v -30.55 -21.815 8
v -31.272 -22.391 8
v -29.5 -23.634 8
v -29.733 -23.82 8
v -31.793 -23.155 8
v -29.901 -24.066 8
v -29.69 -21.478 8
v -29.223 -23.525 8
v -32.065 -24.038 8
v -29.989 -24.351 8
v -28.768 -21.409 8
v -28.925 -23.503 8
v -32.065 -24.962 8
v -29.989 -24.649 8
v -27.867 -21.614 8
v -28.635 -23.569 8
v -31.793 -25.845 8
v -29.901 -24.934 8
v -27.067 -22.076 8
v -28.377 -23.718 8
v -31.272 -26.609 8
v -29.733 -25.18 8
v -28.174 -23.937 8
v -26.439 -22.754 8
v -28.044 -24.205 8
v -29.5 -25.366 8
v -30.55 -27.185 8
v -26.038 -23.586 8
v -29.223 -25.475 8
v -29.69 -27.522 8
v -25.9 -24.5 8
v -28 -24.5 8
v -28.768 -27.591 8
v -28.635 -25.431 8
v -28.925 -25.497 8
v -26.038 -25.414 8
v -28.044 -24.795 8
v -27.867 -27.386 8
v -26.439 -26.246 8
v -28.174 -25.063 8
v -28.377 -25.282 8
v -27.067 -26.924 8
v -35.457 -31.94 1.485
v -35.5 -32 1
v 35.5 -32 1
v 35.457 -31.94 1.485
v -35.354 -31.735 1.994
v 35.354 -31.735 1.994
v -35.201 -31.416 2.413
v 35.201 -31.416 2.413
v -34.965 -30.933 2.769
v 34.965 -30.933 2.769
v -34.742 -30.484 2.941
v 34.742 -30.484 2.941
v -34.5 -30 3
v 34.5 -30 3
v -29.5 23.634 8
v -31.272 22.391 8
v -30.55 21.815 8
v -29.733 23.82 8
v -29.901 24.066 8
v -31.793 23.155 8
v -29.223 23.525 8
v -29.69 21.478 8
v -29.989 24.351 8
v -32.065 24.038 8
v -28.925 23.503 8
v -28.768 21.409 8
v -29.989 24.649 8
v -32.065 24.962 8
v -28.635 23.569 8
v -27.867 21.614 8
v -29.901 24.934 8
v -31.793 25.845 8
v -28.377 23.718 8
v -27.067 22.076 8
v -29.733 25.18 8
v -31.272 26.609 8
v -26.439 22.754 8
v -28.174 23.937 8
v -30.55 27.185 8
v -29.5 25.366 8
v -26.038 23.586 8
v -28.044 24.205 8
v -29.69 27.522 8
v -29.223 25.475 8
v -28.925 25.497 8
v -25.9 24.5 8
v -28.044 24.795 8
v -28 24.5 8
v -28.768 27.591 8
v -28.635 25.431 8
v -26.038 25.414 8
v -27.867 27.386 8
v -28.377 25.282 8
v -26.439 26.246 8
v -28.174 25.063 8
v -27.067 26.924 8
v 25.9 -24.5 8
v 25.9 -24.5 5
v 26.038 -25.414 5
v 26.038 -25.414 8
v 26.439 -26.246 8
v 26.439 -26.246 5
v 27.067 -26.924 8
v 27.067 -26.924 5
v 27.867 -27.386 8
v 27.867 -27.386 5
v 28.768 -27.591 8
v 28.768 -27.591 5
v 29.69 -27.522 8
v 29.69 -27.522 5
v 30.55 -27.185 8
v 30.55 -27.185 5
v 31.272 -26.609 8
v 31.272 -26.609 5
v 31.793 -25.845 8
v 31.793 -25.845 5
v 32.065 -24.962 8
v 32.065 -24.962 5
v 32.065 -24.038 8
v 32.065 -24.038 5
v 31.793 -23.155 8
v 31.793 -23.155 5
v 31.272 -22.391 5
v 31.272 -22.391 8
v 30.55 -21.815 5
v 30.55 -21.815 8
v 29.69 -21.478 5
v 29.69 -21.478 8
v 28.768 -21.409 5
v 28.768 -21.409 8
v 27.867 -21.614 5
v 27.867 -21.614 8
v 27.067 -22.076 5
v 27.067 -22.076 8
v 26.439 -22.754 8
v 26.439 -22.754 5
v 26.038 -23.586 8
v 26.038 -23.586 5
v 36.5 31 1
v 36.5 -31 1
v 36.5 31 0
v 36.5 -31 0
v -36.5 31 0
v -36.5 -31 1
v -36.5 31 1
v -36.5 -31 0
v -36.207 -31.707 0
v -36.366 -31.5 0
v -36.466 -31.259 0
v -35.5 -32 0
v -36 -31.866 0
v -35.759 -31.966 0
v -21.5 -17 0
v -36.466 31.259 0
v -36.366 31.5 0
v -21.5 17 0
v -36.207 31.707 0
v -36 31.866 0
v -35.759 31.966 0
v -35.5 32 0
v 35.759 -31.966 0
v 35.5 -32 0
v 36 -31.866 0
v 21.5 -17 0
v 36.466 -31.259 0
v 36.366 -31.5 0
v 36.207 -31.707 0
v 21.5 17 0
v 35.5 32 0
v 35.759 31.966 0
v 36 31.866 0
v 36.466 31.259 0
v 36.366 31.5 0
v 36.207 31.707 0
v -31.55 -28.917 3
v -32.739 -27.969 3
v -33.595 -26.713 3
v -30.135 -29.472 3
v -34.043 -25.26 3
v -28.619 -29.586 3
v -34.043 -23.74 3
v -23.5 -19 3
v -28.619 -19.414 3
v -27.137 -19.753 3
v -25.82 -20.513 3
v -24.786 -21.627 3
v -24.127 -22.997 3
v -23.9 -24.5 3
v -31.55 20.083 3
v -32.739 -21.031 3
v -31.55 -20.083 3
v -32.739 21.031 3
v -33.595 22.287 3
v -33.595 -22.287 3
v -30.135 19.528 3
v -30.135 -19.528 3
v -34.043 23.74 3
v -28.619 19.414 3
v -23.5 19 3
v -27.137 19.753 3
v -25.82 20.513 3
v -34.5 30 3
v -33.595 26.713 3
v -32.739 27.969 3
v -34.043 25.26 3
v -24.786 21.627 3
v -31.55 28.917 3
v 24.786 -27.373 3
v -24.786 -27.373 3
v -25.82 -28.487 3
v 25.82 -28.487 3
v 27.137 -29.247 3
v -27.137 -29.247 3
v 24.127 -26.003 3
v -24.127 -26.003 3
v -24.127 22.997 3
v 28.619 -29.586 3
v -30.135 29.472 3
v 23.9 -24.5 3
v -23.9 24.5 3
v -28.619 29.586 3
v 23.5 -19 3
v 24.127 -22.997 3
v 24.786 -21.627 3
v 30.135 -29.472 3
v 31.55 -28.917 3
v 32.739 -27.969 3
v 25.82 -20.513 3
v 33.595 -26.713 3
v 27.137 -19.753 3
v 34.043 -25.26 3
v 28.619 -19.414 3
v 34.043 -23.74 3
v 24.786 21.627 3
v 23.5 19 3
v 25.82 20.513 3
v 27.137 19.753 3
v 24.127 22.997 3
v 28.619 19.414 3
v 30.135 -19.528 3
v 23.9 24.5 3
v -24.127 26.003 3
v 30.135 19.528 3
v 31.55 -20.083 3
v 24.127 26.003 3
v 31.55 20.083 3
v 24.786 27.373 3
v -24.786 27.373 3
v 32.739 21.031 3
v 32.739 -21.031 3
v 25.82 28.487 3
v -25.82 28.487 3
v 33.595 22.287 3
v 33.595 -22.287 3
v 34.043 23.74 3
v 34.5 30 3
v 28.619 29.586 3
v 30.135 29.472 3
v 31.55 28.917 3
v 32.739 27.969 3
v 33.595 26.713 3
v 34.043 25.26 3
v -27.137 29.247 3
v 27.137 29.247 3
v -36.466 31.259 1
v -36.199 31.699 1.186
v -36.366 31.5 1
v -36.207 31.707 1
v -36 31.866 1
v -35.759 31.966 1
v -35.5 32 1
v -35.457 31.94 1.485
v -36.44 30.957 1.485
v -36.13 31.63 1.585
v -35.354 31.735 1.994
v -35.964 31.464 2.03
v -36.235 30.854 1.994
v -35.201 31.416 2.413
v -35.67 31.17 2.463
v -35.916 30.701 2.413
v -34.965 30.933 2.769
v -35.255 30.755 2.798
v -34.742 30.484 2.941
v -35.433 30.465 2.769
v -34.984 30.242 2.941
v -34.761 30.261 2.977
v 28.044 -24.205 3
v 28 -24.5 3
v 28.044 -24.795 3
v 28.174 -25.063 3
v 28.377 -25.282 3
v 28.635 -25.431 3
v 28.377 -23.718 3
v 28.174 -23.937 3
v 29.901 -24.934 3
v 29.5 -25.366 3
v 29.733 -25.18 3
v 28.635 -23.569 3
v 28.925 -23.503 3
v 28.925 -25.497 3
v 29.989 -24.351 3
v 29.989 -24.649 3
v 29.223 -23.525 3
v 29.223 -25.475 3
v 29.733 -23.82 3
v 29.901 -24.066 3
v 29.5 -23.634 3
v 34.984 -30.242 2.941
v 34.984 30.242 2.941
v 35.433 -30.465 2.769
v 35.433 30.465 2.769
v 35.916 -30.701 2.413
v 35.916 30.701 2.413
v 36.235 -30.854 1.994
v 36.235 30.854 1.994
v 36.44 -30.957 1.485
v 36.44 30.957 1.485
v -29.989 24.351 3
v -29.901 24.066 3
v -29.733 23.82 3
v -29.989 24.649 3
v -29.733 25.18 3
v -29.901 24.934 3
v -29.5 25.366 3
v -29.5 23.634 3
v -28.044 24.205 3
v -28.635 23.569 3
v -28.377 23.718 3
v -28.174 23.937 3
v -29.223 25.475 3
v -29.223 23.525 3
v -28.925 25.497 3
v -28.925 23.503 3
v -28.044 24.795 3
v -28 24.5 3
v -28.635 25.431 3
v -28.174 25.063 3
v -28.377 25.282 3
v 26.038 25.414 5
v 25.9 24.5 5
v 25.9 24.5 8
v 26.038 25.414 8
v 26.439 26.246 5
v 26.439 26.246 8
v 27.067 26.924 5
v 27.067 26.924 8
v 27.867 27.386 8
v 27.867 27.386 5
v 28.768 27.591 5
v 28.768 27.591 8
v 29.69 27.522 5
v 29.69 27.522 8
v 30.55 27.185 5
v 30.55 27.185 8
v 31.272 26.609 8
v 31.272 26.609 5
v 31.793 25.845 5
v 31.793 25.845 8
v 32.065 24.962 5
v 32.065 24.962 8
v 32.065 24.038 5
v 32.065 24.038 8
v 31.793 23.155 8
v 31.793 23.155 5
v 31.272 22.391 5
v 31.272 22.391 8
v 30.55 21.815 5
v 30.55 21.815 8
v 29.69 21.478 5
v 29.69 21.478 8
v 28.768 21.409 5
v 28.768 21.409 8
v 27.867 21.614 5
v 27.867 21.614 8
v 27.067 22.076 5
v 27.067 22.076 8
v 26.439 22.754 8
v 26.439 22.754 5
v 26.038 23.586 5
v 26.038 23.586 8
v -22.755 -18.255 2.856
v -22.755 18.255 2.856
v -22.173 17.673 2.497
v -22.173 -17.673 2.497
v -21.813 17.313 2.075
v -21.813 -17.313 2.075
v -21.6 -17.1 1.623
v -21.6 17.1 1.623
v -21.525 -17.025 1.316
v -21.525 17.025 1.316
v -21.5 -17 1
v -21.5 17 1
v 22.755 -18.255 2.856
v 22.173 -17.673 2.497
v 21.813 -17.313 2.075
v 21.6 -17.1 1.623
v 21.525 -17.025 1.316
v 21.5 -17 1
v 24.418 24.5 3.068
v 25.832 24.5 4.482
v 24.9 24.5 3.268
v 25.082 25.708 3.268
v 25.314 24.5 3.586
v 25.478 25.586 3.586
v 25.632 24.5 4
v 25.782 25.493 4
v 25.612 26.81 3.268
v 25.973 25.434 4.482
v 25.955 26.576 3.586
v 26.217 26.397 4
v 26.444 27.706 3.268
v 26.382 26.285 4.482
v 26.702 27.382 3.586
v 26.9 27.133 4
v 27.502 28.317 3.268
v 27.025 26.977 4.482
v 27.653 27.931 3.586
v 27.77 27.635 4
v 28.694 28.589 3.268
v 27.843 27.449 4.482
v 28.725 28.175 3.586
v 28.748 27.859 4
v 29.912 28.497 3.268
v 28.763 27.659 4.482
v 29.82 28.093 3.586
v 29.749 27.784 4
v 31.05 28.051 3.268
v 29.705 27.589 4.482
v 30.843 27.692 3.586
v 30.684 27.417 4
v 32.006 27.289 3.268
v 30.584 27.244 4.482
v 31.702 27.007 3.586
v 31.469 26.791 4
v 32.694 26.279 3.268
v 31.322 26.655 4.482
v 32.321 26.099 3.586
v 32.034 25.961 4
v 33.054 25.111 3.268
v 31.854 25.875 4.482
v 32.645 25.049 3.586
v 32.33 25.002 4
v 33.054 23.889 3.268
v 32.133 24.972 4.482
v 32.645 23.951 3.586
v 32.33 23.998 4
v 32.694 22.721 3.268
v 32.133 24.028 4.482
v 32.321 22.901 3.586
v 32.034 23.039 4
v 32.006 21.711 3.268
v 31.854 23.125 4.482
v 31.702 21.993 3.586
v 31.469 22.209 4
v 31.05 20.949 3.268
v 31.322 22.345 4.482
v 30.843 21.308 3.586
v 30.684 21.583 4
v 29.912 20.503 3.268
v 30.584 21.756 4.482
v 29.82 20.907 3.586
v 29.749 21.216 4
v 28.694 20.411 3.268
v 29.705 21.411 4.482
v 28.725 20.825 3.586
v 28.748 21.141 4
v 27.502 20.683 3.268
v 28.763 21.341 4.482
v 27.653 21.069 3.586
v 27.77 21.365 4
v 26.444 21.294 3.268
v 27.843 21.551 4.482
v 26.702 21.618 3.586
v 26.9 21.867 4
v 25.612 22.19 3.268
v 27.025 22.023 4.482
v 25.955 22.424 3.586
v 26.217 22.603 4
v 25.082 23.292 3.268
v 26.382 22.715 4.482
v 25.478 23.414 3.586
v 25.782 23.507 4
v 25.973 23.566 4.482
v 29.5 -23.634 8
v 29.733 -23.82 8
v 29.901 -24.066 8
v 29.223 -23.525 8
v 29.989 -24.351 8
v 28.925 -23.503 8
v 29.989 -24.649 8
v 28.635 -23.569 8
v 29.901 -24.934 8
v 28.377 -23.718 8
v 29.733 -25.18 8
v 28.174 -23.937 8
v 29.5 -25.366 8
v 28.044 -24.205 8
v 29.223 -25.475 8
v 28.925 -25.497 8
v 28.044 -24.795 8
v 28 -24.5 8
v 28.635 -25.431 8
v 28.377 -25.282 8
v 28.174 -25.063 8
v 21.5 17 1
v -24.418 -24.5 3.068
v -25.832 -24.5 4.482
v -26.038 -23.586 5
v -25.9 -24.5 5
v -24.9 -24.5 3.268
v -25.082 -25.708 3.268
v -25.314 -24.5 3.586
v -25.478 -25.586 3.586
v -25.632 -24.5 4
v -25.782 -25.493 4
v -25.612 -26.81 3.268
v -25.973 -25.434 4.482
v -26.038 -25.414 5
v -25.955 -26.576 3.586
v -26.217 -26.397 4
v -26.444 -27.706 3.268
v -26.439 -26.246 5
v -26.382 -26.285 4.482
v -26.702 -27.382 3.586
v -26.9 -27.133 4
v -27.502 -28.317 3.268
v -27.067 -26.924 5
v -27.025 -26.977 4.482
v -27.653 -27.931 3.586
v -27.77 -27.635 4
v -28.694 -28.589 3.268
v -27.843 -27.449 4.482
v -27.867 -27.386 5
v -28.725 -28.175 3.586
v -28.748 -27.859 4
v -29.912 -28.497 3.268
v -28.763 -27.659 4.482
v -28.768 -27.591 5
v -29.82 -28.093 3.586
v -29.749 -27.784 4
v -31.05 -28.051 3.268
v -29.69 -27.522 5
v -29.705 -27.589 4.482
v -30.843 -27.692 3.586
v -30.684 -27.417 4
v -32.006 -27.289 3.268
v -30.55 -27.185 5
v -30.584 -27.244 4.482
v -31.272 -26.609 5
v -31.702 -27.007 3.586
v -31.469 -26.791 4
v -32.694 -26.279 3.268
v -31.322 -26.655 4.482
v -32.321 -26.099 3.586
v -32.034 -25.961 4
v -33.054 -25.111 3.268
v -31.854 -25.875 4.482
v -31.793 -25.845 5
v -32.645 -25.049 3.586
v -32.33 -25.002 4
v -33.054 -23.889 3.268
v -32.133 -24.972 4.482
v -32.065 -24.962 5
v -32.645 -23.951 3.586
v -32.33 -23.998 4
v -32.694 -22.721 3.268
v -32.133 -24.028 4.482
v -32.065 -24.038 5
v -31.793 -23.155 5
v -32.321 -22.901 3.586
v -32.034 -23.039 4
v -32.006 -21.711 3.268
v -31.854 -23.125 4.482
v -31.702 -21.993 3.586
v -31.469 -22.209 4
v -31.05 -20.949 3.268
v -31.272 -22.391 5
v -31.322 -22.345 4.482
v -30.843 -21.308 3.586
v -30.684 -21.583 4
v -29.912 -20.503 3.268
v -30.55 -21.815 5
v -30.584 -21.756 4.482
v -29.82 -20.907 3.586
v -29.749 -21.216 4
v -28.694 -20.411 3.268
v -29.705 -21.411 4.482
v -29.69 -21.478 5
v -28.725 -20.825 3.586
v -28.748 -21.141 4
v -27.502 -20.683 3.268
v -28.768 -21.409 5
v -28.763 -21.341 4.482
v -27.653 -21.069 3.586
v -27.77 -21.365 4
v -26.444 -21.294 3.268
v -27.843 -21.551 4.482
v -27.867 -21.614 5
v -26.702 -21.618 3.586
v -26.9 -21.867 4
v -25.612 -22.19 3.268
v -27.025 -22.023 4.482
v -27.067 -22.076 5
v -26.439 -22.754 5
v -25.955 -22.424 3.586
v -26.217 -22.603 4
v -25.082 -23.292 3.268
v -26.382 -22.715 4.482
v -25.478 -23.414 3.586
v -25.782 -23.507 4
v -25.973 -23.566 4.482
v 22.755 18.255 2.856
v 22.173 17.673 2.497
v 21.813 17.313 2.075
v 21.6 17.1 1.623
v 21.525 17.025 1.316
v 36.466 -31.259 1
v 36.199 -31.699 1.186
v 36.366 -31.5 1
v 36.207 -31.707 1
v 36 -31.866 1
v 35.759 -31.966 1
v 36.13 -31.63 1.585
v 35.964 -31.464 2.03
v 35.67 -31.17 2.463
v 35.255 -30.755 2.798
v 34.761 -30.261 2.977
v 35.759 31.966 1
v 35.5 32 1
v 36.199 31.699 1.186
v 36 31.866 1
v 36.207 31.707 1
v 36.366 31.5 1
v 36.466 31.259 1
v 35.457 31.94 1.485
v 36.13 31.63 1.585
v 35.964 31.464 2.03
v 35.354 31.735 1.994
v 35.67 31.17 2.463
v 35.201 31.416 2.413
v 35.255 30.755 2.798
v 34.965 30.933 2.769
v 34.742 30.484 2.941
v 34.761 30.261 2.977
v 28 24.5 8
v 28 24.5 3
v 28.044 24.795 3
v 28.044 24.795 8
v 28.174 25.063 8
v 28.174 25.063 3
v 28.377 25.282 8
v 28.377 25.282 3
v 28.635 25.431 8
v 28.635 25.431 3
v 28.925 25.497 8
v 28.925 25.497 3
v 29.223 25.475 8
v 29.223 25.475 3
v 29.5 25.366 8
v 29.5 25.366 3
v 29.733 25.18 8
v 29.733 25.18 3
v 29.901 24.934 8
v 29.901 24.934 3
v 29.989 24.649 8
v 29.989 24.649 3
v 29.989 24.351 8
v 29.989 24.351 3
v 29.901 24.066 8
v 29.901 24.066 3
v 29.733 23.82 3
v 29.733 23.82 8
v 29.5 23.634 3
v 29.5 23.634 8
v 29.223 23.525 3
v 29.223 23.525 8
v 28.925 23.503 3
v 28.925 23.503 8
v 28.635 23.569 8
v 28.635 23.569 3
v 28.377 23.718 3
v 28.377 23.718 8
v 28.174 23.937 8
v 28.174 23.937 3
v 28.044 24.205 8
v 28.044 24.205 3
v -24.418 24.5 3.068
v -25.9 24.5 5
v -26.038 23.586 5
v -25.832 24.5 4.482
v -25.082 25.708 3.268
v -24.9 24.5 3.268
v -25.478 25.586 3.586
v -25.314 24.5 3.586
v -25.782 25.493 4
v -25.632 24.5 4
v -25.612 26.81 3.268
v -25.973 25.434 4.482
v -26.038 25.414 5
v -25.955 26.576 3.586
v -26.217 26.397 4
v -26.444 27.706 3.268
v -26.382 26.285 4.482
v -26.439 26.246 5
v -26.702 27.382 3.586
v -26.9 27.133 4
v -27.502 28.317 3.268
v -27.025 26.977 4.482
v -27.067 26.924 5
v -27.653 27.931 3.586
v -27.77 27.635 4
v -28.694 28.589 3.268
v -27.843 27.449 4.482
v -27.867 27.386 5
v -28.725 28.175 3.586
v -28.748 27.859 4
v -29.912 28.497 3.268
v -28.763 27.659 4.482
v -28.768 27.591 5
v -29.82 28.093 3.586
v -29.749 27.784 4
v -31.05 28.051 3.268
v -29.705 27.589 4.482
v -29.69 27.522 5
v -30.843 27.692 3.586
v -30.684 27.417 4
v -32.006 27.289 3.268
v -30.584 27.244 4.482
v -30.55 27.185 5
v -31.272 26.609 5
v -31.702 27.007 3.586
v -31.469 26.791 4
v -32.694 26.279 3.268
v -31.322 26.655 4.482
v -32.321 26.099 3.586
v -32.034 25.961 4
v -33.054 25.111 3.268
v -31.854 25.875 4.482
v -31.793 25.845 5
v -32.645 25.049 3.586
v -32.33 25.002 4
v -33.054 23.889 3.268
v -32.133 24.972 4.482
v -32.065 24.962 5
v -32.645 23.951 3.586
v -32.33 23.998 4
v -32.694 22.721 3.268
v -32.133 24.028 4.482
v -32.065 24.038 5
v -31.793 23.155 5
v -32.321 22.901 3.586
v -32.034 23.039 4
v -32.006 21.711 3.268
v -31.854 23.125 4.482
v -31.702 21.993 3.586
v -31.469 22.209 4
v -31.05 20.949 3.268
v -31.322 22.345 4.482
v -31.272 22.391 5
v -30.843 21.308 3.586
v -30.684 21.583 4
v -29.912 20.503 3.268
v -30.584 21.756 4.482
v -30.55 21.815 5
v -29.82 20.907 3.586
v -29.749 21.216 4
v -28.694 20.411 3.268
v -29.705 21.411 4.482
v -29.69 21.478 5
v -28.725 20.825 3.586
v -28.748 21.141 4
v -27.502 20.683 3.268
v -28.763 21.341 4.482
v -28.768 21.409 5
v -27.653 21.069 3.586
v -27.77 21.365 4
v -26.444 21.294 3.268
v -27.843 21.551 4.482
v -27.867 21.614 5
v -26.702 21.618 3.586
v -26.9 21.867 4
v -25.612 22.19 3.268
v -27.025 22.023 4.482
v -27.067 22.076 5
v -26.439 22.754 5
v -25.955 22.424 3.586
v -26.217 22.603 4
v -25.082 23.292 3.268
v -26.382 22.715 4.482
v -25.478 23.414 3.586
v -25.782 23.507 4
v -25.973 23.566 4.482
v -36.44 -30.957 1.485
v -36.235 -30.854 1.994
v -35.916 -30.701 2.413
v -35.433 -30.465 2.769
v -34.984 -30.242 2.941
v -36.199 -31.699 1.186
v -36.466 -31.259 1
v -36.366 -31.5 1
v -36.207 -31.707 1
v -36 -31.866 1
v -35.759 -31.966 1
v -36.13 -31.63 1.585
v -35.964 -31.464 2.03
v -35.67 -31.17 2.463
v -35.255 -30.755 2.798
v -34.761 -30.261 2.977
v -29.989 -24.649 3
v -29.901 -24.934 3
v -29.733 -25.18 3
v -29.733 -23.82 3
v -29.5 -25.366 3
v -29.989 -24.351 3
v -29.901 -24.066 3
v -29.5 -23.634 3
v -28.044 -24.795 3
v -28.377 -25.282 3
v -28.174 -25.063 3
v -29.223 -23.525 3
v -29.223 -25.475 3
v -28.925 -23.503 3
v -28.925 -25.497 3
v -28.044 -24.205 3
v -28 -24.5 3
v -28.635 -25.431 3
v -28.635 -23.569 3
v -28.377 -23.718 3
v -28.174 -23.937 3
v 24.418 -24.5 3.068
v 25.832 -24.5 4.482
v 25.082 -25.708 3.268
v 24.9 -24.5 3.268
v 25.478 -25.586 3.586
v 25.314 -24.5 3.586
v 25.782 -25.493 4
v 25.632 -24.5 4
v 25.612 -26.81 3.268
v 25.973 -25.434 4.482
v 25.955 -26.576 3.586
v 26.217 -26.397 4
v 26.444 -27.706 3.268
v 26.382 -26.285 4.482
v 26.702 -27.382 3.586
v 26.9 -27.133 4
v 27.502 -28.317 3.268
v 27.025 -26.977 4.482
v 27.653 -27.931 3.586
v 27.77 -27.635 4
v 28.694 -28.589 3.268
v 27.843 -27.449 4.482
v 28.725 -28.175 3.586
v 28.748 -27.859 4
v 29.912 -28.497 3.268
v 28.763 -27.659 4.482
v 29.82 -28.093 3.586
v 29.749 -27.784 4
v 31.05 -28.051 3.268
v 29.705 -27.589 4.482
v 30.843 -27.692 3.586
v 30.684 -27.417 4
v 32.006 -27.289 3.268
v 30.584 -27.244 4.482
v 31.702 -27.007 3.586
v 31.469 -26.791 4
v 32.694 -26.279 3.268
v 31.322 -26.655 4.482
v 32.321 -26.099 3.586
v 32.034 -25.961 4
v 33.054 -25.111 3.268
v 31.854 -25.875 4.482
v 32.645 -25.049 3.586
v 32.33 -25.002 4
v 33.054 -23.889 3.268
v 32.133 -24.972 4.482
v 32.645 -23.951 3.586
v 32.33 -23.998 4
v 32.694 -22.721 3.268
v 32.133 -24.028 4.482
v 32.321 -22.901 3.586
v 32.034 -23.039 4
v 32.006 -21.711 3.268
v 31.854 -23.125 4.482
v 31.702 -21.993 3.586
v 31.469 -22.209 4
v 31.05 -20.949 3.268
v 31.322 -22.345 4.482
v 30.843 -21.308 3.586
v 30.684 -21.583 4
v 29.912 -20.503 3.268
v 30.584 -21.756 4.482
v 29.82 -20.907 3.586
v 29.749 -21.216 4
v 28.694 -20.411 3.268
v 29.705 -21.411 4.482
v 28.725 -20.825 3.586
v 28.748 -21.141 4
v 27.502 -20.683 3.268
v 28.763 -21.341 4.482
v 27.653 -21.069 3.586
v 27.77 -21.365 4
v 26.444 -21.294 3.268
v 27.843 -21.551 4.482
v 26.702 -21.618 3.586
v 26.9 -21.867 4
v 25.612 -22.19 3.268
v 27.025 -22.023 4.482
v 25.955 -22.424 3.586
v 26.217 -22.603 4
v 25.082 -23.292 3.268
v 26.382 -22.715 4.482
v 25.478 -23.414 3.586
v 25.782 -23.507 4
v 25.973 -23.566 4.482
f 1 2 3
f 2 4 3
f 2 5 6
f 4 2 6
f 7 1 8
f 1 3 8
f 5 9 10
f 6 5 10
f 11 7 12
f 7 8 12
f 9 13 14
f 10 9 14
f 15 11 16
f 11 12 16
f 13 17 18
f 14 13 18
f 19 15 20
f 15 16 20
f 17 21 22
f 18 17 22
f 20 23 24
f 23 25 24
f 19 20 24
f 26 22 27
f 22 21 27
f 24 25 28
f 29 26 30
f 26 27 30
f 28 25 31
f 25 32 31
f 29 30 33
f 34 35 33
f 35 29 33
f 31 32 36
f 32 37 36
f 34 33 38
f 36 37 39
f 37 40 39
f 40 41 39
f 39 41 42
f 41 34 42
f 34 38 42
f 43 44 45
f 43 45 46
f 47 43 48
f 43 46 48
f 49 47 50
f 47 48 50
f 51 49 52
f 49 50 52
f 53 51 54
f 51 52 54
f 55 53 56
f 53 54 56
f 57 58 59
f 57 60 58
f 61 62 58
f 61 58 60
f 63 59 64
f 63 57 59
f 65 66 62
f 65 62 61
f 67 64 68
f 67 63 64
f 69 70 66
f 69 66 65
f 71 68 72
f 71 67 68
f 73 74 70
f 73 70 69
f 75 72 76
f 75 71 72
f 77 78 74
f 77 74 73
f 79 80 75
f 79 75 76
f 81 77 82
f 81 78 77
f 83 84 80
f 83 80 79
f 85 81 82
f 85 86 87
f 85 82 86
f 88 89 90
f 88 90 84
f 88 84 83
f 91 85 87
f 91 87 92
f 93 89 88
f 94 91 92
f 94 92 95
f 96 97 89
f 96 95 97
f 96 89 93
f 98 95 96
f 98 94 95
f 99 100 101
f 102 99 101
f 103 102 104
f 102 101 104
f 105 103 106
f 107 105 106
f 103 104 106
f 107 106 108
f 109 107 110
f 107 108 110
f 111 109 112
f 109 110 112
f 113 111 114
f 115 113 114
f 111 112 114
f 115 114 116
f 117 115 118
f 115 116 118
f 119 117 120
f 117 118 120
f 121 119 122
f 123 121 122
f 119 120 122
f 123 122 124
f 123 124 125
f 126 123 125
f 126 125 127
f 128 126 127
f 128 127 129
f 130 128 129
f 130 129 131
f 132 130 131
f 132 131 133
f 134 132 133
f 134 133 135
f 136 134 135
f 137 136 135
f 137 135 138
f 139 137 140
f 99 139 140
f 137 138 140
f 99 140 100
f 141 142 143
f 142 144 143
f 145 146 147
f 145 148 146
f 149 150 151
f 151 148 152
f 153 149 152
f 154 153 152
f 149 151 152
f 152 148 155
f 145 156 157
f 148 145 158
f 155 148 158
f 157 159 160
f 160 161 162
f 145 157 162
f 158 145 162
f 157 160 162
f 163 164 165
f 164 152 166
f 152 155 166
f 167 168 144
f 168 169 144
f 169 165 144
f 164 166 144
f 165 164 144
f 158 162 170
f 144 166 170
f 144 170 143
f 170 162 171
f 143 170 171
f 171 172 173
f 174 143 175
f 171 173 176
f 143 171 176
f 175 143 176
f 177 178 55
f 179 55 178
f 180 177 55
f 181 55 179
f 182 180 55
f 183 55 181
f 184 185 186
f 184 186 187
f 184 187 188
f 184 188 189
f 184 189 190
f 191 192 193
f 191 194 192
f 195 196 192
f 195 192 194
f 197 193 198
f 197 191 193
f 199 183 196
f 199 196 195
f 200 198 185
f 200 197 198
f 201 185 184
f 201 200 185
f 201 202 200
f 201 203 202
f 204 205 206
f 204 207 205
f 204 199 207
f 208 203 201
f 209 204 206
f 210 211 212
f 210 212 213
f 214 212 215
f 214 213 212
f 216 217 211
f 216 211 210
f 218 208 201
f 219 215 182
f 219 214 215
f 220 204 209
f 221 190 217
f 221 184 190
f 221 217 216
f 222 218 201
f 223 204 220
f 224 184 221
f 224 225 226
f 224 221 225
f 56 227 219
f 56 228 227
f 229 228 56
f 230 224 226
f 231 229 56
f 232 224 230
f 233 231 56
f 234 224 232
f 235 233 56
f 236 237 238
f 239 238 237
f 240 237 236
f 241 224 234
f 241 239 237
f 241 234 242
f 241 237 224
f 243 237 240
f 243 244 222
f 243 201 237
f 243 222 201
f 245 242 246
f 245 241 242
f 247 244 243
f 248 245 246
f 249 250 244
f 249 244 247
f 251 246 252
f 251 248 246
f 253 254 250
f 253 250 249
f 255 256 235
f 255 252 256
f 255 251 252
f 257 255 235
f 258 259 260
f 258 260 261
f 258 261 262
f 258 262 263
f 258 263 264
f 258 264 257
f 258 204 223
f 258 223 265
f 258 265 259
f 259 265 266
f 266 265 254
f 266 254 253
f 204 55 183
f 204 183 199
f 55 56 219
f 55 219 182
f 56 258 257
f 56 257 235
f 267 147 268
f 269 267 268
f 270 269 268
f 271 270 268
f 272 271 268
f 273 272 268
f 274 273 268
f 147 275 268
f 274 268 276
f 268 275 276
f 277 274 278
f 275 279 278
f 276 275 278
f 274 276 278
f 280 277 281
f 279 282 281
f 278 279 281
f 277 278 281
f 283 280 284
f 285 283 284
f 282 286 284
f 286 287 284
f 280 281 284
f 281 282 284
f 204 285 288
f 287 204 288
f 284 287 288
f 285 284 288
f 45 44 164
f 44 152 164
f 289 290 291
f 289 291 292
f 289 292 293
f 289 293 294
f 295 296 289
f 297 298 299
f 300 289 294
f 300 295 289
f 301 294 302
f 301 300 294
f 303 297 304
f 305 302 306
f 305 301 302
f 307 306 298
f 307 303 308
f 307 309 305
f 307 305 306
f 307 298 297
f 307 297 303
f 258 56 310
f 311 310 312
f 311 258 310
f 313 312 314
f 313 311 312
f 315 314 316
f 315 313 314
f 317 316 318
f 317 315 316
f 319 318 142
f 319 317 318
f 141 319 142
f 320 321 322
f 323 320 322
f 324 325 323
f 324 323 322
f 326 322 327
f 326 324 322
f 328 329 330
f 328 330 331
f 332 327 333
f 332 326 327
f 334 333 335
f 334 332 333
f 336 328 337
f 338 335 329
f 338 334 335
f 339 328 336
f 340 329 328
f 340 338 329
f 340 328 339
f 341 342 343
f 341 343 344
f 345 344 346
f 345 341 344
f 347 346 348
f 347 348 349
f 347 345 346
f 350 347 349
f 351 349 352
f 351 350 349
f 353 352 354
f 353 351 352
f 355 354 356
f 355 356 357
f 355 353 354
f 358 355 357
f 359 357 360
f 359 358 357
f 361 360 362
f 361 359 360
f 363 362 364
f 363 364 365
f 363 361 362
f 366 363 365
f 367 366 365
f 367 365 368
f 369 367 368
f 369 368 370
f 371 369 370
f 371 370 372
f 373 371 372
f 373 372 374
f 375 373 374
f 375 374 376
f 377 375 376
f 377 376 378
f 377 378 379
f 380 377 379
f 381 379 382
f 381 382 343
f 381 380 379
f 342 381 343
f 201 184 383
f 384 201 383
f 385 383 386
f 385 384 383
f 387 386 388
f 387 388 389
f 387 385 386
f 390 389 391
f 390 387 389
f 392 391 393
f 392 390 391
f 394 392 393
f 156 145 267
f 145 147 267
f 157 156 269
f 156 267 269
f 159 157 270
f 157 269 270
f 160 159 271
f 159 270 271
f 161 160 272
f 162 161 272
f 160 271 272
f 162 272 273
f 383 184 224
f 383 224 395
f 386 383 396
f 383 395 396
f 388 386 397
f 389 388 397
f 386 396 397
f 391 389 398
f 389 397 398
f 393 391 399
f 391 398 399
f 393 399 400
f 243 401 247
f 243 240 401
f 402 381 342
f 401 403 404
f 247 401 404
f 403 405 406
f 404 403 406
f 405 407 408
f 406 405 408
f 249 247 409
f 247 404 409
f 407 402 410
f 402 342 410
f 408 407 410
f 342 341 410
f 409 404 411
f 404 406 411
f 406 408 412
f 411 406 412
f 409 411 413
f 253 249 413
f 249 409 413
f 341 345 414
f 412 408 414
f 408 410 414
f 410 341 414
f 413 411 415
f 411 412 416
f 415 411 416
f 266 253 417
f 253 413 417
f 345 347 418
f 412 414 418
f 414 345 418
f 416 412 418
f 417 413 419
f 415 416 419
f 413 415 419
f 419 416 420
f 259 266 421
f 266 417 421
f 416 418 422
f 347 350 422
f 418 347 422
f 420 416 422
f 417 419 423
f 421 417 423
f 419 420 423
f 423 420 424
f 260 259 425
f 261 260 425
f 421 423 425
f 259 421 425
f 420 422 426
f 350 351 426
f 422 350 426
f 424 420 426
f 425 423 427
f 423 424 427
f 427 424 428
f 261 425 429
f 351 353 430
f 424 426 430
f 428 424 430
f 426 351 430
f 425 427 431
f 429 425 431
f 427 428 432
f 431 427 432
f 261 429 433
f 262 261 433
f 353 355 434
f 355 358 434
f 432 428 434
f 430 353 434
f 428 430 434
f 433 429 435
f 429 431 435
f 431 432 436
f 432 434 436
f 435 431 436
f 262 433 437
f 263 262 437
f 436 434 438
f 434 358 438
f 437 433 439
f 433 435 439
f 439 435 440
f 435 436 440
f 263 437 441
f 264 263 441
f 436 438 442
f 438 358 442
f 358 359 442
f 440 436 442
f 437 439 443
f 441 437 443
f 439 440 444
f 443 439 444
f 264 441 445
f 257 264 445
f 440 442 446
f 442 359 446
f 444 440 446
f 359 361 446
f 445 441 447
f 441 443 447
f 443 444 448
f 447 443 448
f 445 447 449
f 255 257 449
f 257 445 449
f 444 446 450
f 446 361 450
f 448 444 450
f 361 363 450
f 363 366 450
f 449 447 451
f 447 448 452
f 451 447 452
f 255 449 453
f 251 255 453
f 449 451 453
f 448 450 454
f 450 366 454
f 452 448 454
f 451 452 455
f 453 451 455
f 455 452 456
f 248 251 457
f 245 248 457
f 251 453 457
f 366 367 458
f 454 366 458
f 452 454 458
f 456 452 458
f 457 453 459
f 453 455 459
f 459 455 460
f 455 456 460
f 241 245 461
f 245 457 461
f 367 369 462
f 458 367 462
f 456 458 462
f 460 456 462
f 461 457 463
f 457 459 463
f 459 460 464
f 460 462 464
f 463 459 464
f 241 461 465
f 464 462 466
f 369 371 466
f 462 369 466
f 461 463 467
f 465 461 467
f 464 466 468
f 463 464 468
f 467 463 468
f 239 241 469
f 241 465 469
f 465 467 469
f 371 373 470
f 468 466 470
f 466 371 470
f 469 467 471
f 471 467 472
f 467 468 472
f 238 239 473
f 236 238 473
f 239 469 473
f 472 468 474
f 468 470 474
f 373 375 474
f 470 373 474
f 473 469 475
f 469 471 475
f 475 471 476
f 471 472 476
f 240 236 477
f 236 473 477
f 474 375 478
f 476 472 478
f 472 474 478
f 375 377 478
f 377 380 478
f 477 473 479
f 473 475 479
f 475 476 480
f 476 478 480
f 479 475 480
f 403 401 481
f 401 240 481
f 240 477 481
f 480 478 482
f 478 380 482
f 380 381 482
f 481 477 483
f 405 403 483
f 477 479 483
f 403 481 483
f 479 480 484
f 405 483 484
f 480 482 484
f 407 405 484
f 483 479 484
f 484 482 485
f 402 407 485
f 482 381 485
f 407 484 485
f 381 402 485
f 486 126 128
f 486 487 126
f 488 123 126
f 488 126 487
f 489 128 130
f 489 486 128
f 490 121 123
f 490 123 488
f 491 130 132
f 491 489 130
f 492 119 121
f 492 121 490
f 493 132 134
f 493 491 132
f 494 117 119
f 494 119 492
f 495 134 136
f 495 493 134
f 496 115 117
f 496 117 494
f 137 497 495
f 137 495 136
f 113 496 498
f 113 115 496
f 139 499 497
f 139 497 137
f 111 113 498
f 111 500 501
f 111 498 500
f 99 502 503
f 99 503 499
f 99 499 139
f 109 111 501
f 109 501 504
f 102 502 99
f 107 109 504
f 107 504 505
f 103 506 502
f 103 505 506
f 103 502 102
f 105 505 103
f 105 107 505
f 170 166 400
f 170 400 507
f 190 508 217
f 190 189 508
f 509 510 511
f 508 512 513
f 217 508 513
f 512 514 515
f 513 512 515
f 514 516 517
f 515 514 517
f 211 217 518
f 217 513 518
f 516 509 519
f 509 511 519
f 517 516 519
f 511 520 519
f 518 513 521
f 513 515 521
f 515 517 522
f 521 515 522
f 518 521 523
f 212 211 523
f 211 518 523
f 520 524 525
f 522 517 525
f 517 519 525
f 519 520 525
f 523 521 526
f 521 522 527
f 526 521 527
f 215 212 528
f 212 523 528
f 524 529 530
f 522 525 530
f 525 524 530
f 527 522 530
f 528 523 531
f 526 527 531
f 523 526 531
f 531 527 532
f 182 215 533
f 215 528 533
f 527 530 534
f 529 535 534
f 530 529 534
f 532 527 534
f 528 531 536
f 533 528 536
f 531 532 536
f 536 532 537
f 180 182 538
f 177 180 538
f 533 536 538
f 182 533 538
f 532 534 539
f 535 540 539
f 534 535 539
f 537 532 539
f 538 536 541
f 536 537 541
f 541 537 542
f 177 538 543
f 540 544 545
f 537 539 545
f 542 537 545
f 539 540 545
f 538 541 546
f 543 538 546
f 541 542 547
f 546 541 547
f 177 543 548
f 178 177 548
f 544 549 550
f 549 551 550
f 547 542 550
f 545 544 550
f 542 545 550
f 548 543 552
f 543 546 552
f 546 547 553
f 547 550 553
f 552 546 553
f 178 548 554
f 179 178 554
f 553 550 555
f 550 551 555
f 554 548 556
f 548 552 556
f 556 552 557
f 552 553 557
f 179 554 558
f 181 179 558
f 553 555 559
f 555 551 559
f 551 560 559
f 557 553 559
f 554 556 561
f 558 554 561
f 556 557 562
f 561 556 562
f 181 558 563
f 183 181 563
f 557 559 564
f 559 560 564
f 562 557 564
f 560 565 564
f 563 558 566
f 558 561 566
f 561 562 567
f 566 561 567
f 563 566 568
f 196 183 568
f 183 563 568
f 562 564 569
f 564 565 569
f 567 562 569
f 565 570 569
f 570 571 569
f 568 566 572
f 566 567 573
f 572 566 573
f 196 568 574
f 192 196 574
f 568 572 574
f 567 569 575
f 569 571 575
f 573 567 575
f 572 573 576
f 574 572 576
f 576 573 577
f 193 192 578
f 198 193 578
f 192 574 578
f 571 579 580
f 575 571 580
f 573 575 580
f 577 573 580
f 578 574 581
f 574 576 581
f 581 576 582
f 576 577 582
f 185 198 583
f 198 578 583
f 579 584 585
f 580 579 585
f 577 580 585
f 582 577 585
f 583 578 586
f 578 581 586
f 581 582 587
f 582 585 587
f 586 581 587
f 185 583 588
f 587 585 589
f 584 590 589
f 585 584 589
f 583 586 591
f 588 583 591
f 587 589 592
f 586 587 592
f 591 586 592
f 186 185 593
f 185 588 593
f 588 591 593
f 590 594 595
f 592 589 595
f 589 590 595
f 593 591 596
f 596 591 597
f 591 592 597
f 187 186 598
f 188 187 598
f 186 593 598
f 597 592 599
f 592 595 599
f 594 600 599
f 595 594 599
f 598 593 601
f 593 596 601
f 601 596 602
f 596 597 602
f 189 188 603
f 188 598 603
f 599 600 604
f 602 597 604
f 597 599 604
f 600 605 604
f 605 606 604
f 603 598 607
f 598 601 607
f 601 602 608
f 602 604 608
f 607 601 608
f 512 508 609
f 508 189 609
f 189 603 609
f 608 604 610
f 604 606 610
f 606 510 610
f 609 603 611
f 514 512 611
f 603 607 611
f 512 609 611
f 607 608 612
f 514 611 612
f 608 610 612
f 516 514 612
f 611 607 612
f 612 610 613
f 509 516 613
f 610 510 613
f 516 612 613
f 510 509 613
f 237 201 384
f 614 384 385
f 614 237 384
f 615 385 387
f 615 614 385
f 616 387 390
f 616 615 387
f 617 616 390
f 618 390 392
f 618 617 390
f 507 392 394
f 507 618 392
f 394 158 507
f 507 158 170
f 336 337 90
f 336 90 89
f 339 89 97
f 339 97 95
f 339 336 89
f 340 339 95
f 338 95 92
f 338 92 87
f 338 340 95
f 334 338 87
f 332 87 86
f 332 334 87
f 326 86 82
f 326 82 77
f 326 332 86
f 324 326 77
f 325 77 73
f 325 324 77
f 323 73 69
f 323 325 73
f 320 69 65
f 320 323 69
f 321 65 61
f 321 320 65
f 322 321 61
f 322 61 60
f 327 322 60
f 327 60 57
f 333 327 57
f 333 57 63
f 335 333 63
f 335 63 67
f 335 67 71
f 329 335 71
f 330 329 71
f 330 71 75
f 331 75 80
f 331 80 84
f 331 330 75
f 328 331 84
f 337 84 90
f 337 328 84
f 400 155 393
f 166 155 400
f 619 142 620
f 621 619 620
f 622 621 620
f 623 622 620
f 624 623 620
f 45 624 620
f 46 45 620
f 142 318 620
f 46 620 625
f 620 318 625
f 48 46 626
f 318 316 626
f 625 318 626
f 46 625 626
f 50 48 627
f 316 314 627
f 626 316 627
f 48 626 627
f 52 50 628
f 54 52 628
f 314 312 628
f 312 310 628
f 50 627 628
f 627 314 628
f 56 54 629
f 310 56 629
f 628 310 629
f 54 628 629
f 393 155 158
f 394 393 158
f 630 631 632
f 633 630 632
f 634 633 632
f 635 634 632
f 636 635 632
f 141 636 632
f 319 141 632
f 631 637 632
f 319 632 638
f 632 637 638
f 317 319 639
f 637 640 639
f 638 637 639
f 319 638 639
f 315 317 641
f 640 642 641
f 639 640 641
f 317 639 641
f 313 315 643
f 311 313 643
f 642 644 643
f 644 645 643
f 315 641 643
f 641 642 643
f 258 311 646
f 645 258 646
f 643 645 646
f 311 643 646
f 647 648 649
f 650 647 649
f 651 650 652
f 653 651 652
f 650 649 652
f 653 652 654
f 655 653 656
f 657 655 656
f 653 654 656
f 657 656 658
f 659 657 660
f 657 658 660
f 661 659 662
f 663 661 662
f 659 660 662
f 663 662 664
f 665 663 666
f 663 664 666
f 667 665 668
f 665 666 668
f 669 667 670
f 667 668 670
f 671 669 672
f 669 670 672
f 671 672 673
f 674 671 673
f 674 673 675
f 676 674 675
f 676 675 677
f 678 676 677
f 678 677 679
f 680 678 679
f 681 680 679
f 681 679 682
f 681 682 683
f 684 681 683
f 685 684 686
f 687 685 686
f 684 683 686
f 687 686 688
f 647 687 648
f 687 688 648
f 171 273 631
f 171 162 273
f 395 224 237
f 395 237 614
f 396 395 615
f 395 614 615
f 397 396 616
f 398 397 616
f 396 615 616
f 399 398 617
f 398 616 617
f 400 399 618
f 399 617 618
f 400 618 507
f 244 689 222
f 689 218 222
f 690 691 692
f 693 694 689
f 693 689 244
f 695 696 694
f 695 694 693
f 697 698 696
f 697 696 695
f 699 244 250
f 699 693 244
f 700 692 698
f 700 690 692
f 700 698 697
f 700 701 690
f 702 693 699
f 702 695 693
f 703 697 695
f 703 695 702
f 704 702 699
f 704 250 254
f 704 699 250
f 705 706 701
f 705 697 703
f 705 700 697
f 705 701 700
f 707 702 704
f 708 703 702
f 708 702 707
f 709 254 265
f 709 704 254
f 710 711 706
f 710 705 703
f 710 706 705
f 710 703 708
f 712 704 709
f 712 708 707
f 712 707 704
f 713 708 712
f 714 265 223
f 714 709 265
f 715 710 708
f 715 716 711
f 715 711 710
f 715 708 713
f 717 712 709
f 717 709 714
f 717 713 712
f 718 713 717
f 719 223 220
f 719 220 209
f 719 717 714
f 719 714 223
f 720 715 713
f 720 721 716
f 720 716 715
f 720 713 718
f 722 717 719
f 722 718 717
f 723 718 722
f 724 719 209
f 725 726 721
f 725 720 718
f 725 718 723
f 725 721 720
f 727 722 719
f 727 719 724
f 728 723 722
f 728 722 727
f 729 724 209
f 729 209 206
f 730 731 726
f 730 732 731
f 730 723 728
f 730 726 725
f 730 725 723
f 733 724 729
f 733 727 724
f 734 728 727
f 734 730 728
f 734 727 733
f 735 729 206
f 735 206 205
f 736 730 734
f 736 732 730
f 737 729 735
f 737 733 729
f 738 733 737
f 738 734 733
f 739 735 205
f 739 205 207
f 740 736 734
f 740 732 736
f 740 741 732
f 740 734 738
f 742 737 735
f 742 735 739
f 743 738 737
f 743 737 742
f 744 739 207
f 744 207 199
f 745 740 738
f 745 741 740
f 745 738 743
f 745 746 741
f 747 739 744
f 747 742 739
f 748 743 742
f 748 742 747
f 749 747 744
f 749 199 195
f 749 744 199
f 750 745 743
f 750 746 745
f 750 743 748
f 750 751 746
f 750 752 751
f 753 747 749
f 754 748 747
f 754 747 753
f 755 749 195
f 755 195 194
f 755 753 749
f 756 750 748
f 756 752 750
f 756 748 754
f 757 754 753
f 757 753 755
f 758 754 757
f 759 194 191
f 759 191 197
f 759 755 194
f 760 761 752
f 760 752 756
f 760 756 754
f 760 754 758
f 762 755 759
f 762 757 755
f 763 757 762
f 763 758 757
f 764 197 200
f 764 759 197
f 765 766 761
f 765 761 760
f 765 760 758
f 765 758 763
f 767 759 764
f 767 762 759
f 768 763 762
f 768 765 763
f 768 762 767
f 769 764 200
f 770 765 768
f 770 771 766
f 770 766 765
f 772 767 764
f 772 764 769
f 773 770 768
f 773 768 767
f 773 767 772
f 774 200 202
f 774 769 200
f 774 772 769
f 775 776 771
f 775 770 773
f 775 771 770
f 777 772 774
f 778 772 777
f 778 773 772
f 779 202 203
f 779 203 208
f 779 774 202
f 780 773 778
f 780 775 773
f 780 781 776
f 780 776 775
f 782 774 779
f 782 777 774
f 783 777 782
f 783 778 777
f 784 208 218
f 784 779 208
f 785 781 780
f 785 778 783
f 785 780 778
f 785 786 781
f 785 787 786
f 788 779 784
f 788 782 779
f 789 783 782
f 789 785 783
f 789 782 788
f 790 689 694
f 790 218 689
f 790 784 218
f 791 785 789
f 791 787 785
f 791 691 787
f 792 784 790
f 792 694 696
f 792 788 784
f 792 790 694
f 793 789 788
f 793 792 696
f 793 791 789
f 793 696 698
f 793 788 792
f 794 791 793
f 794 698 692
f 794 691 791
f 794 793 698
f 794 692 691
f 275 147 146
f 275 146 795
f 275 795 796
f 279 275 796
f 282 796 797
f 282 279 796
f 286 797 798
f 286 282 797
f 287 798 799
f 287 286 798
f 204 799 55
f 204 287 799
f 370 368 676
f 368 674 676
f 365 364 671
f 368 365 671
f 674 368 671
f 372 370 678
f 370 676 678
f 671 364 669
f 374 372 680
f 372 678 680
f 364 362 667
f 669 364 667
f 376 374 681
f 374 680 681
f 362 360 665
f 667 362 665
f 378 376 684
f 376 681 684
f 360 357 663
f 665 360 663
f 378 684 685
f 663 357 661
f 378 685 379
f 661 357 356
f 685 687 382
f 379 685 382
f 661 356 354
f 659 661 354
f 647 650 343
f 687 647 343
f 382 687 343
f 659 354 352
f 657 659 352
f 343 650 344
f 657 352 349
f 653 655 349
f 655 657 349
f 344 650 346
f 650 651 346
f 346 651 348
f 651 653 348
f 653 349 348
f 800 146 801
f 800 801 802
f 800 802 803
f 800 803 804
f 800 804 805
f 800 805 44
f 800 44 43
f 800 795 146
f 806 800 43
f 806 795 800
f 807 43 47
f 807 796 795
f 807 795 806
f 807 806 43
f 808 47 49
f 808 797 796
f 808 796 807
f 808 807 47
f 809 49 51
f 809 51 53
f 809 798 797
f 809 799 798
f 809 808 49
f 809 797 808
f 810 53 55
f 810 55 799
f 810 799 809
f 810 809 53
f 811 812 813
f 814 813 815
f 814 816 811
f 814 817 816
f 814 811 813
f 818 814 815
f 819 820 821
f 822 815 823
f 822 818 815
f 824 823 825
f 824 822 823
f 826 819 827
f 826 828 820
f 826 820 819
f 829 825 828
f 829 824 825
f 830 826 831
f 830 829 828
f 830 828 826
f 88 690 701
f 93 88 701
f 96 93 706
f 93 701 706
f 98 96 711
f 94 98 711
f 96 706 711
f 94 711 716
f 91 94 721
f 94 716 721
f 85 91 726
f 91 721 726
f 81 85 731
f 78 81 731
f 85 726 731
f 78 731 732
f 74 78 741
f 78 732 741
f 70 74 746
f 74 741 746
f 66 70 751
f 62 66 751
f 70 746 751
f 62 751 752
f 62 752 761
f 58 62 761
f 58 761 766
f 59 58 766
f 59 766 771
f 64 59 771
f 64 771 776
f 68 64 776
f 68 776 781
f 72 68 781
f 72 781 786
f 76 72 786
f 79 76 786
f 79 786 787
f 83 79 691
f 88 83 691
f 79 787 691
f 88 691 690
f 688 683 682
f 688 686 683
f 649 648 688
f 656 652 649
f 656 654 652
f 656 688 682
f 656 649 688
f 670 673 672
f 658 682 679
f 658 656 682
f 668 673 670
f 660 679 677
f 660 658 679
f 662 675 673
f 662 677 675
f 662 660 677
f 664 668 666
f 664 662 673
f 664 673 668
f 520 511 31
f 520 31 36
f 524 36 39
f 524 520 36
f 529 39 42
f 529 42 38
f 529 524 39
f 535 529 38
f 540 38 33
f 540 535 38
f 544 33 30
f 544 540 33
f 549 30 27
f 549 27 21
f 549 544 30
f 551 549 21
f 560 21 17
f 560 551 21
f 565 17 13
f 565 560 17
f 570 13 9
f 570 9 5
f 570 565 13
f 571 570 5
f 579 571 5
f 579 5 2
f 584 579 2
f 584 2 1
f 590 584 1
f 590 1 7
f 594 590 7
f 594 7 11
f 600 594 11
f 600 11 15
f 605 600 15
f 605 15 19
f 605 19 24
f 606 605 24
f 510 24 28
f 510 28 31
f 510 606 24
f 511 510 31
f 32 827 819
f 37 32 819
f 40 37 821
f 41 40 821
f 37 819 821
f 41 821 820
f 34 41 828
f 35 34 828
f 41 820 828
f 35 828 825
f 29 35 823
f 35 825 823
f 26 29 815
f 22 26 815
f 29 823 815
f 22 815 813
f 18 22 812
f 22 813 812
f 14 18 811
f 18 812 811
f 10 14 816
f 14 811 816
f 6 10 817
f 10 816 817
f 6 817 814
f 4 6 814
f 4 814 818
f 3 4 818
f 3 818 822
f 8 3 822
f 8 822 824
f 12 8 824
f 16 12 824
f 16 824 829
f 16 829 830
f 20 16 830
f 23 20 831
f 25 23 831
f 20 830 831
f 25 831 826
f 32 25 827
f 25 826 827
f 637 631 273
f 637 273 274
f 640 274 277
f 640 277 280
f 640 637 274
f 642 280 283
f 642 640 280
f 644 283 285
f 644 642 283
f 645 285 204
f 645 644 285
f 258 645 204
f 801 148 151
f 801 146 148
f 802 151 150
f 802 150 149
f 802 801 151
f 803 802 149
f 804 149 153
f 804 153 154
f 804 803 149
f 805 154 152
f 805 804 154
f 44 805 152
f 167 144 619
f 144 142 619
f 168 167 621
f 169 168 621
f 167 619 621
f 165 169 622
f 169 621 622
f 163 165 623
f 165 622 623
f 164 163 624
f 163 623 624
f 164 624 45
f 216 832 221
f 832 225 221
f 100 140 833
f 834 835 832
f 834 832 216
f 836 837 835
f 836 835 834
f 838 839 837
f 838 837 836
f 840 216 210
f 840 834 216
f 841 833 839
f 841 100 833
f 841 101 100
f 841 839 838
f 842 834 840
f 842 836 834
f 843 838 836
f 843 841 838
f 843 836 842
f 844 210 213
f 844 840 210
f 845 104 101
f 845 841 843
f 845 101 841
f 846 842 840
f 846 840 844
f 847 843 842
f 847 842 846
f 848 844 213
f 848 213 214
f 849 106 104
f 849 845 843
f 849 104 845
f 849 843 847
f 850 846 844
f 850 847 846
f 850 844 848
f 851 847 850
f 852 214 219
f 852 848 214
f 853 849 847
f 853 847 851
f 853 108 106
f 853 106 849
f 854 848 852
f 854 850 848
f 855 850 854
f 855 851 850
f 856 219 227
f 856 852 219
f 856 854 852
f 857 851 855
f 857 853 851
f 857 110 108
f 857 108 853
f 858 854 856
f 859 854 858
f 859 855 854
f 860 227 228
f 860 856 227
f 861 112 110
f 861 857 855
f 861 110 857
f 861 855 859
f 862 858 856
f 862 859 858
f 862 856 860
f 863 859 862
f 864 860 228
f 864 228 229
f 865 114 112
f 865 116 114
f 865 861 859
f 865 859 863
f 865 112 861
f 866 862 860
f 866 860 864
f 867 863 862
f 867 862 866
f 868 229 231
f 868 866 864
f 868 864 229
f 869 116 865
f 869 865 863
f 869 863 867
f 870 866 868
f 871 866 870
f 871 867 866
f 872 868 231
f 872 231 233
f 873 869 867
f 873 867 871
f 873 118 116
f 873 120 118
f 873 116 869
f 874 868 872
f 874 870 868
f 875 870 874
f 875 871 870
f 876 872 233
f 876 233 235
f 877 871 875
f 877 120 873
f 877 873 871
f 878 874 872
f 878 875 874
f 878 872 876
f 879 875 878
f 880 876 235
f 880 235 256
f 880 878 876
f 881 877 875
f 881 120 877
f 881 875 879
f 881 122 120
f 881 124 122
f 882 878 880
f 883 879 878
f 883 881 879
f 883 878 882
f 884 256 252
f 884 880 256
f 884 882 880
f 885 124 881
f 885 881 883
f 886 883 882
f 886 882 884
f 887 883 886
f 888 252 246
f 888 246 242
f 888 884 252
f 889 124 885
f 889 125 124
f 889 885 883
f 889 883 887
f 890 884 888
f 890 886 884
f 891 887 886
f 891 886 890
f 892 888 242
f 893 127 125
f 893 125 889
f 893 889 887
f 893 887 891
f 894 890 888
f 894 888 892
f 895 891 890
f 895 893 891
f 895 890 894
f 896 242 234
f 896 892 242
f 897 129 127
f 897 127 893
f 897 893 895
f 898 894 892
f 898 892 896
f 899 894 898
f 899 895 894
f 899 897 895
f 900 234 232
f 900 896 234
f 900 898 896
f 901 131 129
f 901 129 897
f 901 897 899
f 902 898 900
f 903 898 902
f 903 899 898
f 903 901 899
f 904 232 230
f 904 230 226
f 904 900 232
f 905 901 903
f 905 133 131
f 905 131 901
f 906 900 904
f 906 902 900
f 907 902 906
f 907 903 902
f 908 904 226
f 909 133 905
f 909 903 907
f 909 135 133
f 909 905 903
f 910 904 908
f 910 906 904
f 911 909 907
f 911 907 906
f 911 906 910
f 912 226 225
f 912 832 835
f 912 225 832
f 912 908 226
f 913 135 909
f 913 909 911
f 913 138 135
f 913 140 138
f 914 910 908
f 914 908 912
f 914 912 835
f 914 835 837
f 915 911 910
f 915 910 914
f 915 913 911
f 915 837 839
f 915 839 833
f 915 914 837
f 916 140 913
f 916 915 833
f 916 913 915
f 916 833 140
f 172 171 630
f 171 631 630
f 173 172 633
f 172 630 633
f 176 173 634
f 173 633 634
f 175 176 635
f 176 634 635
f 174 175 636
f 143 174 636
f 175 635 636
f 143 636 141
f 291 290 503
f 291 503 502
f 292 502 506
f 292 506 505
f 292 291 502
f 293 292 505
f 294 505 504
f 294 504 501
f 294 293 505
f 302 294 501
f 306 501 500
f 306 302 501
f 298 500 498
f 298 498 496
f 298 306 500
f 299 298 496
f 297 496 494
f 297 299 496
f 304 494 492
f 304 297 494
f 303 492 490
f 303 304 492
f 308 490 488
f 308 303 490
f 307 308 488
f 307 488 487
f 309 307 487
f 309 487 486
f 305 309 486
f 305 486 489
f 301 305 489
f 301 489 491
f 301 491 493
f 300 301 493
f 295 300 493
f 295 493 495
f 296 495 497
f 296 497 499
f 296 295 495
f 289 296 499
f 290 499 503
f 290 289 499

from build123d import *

# Parameters (mm, degrees)
SKETCH001_R        = 3.1
SKETCH001_R_2      = 1
PAD_DEPTH          = 5
SKETCH_W           = 73
SKETCH_H           = 64
SKETCH_W_2         = 43
SKETCH_H_2         = 34
PAD001_DEPTH       = 3
POLARPATTERN_COUNT = 2
FILLET_R           = 2
FILLET001_R        = 1
FILLET002_R        = 1
FILLET003_R        = 1
FILLET004_R        = 1


with BuildPart() as part:
    # Sketch001 → Pad (new body)
    with BuildSketch(Plane.XY.offset(3)):
        with Locations((-29, 24.5)):
            Circle(SKETCH001_R)
        with Locations((-29, 24.5)):
            Circle(SKETCH001_R_2, mode=Mode.SUBTRACT)
    pad = extrude(amount=PAD_DEPTH)

    # Sketch → Pad001 (join)
    with BuildSketch(Plane.XY):
        Rectangle(SKETCH_W, SKETCH_H)
        Rectangle(SKETCH_W_2, SKETCH_H_2, mode=Mode.SUBTRACT)
    extrude(amount=PAD001_DEPTH)

    # Mirrored: Pad across Sketch001 V_Axis
    add(pad.mirror(Plane(origin=(0, 0, 3), x_dir=(0, 0, 1), z_dir=(1, 0, 0))))

    # PolarPattern: Pad ×2 about axis
    polarpattern_axis = Axis((0, 0, 3), (0, 0, 1))
    for i in range(1, POLARPATTERN_COUNT):
        add(pad.rotate(polarpattern_axis, i * 360 / POLARPATTERN_COUNT))

    # Mirrored001: Pad across XZ
    add(pad.mirror(Plane.XZ))

    # Fillet
    fillet_edges = [part.edges().sort_by_distance(p)[0] for p in [
        (0, 32, 3),
        (-36.5, 0, 3),
        (36.5, 0, 3),
        (0, -32, 3),
        (-32.1, -24.5, 3),
        (32.1, -24.5, 3),
        (-32.1, 24.5, 3),
        (0, 17, 3),
        (-21.5, 0, 3),
        (21.5, 0, 3),
        (0, -17, 3),
        (32.1, 24.5, 3),
    ]]
    fillet(fillet_edges, radius=FILLET_R)

    # Fillet001
    fillet001_edges = [part.edges().sort_by_distance(p)[0] for p in [
        (-36.5, -32, 0.5),
    ]]
    fillet(fillet001_edges, radius=FILLET001_R)

    # Fillet002
    fillet002_edges = [part.edges().sort_by_distance(p)[0] for p in [
        (-36.5, 32, 0.5),
    ]]
    fillet(fillet002_edges, radius=FILLET002_R)

    # Fillet003
    fillet003_edges = [part.edges().sort_by_distance(p)[0] for p in [
        (36.5, 32, 0.5),
    ]]
    fillet(fillet003_edges, radius=FILLET003_R)

    # Fillet004
    fillet004_edges = [part.edges().sort_by_distance(p)[0] for p in [
        (36.5, -32, 0.5),
    ]]
    fillet(fillet004_edges, radius=FILLET004_R)


solid = part.part
